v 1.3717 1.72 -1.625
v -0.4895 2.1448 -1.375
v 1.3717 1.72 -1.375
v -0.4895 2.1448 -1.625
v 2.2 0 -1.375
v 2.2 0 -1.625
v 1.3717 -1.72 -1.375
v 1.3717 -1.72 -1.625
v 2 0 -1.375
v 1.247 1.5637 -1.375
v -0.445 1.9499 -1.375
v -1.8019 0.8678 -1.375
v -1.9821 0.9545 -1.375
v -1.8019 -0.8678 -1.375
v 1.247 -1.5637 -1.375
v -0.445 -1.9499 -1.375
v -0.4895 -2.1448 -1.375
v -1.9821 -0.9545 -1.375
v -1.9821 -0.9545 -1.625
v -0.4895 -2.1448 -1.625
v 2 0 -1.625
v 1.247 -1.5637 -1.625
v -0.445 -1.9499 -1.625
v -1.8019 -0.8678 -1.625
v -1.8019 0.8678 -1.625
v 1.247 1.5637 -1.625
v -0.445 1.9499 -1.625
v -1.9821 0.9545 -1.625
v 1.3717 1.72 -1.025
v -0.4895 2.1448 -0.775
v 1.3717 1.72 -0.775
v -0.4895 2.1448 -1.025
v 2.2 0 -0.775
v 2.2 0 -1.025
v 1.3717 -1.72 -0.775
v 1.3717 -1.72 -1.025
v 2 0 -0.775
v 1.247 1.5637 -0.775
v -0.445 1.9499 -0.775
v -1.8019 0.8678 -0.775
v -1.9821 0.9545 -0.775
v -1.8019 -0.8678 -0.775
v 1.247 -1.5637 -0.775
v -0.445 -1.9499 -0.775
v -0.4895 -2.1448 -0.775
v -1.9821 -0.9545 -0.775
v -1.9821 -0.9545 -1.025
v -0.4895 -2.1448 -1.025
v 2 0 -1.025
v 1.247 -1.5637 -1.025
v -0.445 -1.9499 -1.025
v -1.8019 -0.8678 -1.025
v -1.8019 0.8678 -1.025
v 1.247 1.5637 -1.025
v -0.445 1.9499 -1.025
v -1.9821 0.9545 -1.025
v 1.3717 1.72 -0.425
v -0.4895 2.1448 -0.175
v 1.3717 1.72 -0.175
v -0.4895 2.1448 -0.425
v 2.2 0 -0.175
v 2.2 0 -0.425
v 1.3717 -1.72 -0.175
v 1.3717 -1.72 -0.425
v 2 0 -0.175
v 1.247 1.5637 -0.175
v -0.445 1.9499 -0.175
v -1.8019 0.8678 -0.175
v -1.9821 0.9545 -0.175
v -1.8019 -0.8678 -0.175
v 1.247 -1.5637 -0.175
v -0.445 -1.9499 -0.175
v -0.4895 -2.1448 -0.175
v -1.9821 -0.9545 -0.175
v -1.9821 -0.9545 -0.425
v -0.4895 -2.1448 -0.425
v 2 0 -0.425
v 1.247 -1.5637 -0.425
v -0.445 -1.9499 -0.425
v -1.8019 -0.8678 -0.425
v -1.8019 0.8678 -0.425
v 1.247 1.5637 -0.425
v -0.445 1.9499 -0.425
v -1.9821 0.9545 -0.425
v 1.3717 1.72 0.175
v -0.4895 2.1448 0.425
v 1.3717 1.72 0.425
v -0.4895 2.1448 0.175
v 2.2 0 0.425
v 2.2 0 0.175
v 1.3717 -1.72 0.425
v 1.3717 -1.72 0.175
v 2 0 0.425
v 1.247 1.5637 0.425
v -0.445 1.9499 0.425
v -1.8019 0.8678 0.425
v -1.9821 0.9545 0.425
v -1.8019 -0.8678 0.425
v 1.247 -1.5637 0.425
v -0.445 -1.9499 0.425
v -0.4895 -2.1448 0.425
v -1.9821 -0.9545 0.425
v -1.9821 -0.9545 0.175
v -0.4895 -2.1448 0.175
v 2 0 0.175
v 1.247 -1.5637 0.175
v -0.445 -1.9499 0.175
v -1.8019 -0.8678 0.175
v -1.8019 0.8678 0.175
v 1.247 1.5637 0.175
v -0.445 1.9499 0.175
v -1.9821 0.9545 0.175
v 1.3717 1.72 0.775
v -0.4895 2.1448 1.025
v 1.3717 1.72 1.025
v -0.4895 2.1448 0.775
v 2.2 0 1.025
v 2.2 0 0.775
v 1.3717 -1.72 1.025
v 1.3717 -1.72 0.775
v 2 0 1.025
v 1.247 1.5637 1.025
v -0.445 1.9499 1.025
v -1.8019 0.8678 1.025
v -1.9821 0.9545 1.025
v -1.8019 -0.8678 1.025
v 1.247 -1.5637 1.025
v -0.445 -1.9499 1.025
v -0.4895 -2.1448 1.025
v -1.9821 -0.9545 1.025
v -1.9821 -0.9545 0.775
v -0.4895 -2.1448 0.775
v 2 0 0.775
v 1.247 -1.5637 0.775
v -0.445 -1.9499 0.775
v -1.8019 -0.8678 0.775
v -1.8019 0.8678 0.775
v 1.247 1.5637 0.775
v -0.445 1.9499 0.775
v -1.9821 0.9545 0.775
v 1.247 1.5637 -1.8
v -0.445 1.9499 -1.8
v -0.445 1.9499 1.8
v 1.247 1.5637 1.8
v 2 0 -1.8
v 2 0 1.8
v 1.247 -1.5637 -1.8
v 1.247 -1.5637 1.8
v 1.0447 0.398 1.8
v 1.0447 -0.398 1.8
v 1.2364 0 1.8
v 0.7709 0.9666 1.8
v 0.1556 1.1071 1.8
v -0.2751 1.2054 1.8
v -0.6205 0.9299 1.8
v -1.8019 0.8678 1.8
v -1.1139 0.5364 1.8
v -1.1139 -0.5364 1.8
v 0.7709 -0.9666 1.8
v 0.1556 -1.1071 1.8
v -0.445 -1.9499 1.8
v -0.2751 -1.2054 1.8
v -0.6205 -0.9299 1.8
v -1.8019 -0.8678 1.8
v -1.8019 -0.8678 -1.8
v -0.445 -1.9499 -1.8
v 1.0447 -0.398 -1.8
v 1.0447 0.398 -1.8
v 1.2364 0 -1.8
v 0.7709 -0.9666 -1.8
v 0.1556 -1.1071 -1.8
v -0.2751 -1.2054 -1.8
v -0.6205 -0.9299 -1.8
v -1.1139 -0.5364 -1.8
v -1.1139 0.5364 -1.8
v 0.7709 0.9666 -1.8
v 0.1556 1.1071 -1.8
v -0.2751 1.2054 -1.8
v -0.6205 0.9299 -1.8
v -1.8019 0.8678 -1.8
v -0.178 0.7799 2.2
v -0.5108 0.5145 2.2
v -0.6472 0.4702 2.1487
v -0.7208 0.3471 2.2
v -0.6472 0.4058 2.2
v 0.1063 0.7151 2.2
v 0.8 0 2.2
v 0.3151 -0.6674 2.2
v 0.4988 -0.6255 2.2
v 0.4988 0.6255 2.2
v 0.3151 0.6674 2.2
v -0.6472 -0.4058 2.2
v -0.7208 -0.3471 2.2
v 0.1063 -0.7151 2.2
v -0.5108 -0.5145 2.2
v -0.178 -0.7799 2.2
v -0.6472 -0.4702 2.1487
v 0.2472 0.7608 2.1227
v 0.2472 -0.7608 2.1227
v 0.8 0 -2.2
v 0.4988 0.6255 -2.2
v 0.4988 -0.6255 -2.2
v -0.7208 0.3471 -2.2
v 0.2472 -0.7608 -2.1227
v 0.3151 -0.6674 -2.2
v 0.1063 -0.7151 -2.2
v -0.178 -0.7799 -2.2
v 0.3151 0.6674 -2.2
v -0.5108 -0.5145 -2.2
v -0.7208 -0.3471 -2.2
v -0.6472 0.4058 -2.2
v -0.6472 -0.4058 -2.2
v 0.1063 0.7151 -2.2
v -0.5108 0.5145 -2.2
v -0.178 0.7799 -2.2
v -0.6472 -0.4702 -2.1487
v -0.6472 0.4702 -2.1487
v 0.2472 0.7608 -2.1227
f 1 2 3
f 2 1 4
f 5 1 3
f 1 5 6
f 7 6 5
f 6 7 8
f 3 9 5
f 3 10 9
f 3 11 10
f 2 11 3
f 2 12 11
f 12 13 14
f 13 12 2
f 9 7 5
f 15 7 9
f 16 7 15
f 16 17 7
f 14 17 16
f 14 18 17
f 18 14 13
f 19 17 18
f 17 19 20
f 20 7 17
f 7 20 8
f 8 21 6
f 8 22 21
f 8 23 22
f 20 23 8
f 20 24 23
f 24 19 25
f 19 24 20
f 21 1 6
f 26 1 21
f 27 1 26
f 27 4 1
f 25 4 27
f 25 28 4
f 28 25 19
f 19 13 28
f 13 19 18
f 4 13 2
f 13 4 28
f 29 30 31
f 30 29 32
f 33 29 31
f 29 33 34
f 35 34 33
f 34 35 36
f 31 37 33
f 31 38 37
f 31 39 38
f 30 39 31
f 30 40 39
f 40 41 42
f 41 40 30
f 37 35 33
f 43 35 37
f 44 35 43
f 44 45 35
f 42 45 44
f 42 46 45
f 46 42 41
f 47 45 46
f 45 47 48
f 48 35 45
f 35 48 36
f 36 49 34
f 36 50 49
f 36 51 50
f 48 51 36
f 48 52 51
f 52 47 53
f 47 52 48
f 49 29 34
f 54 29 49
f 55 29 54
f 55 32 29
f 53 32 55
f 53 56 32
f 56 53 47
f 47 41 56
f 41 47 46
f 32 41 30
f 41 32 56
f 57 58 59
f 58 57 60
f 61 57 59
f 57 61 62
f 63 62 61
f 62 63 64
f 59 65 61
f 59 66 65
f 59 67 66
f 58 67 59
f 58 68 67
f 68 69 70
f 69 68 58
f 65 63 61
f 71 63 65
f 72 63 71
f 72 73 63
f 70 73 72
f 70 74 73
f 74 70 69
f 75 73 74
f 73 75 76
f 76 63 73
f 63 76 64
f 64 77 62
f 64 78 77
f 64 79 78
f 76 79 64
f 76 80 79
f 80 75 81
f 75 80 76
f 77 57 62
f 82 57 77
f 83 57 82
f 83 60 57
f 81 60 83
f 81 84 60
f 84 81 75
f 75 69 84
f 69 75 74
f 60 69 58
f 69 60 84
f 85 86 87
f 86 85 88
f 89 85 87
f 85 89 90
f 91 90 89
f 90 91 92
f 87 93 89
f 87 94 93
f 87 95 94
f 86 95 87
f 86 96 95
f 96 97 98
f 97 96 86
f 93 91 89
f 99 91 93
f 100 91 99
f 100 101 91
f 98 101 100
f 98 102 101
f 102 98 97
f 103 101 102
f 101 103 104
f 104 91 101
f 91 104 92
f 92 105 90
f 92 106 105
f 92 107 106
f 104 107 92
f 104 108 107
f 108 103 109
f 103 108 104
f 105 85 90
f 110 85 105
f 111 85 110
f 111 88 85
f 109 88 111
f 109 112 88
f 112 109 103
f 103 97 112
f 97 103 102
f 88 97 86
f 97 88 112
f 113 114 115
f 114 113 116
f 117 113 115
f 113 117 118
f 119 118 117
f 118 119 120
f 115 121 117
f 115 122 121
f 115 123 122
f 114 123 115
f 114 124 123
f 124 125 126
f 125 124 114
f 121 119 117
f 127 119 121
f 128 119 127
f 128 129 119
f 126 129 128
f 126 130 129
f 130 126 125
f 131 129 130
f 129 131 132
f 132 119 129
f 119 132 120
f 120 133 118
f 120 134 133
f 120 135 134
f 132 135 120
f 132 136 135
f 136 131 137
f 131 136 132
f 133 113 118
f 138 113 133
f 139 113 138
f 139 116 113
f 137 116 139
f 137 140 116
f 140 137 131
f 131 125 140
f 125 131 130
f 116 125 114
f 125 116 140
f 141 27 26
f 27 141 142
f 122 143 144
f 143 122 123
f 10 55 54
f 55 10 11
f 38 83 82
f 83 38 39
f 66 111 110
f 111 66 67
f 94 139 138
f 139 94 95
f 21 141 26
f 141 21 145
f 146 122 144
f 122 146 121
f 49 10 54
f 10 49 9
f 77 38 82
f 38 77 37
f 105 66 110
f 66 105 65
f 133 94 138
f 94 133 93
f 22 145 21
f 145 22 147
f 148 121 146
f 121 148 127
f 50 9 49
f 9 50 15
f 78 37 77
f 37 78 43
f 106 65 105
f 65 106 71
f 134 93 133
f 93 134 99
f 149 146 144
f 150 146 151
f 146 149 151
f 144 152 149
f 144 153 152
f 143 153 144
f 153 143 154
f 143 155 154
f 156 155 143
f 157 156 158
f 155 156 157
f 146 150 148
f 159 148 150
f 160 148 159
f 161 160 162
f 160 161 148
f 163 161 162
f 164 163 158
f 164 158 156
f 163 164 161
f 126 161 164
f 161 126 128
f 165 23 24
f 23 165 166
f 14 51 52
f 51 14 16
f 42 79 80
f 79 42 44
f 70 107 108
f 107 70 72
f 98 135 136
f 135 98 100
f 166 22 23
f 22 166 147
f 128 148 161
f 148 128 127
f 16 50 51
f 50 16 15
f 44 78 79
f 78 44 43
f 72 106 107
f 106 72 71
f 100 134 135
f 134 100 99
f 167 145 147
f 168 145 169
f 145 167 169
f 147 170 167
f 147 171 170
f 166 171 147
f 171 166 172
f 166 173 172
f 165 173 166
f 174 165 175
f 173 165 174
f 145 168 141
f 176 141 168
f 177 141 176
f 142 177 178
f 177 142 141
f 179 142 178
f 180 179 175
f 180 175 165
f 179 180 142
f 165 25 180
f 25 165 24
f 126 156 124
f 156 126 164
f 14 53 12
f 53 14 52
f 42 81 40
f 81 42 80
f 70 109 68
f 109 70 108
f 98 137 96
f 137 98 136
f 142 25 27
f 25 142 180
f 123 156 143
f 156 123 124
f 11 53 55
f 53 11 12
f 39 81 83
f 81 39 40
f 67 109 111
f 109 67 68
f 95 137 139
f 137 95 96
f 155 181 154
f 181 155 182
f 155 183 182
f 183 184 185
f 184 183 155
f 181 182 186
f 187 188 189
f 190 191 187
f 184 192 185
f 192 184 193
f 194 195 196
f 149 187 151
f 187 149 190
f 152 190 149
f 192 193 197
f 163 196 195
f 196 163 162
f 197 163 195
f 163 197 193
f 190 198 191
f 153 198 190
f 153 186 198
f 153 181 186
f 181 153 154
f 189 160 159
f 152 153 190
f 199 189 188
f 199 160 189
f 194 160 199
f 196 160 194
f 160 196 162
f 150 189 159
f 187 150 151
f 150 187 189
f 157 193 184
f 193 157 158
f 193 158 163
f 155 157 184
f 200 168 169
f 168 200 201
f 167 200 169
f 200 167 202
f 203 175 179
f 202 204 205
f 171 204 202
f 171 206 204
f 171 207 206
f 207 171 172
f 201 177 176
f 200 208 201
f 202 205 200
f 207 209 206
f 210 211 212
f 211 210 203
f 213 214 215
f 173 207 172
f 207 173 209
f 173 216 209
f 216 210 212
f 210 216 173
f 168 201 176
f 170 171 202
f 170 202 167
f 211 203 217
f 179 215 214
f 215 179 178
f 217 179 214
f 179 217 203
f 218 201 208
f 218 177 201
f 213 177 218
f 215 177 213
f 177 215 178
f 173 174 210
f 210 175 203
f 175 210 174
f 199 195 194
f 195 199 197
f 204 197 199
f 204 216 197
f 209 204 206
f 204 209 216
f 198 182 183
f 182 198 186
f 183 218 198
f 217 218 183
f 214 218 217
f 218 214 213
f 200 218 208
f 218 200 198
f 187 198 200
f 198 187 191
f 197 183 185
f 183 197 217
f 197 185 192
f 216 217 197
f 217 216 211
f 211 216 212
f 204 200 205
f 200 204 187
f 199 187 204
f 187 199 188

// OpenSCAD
// Parameters
outer_diameter_mm = 4; //[2:8:0.1]
length_mm = 3.6; //[1.8:7.2:0.1]
screw_nominal_diameter_mm = 2; //[1:4:0.1]
bore_diameter_mm = 1.6; //[1:3.2:0.05]
thread_pitch_mm = 0.4; //[0.2:0.8:0.05]
top_chamfer_depth_mm = 0.3; //[0.15:0.6:0.05]
bottom_chamfer_depth_mm = 0.3; //[0.15:0.6:0.05]
knurl_depth_mm = 0.2; //[0.1:0.4:0.05]
knurl_pitch_mm = 0.6; //[0.3:1.2:0.05]
overlap_mm = 0.8; //[0.5:2:0.1]
knurl_ring_thickness_mm = 0.25; //[0.15:0.6:0.05]
knurl_ring_count = 5; //[2:12:1]

// Threaded Insert - complete geometry
module threaded_insert() {
  color([0.8, 0.6, 0.2]) { // Brass color
    difference() {
      union() {
        // Main body
        cylinder(r=outer_diameter_mm/2, h=length_mm, center=true);
        
        // Top entry chamfer
        translate([0, 0, length_mm/2 - (top_chamfer_depth_mm + overlap_mm)/2 + overlap_mm/2])
          cylinder(r1=outer_diameter_mm/2, r2=bore_diameter_mm/2, h=top_chamfer_depth_mm + overlap_mm, center=true);
        
        // Bottom lead-in chamfer
        translate([0, 0, -length_mm/2 + (bottom_chamfer_depth_mm + overlap_mm)/2 - overlap_mm/2])
          cylinder(r1=bore_diameter_mm/2, r2=outer_diameter_mm/2, h=bottom_chamfer_depth_mm + overlap_mm, center=true);
        
        // External knurl/barbs
        for (i = [0:knurl_ring_count-1]) {
          translate([0, 0, -length_mm/2 + top_chamfer_depth_mm + knurl_pitch_mm*i])
            cylinder(r=outer_diameter_mm/2 + knurl_depth_mm, h=knurl_ring_thickness_mm, center=true);
        }
      }
      
      // Internal thread or clearance bore
      cylinder(r=bore_diameter_mm/2, h=length_mm + 2*overlap_mm, center=true);
    }
  }
}

// Assembly
module assembly() {
  threaded_insert();
}

assembly();
